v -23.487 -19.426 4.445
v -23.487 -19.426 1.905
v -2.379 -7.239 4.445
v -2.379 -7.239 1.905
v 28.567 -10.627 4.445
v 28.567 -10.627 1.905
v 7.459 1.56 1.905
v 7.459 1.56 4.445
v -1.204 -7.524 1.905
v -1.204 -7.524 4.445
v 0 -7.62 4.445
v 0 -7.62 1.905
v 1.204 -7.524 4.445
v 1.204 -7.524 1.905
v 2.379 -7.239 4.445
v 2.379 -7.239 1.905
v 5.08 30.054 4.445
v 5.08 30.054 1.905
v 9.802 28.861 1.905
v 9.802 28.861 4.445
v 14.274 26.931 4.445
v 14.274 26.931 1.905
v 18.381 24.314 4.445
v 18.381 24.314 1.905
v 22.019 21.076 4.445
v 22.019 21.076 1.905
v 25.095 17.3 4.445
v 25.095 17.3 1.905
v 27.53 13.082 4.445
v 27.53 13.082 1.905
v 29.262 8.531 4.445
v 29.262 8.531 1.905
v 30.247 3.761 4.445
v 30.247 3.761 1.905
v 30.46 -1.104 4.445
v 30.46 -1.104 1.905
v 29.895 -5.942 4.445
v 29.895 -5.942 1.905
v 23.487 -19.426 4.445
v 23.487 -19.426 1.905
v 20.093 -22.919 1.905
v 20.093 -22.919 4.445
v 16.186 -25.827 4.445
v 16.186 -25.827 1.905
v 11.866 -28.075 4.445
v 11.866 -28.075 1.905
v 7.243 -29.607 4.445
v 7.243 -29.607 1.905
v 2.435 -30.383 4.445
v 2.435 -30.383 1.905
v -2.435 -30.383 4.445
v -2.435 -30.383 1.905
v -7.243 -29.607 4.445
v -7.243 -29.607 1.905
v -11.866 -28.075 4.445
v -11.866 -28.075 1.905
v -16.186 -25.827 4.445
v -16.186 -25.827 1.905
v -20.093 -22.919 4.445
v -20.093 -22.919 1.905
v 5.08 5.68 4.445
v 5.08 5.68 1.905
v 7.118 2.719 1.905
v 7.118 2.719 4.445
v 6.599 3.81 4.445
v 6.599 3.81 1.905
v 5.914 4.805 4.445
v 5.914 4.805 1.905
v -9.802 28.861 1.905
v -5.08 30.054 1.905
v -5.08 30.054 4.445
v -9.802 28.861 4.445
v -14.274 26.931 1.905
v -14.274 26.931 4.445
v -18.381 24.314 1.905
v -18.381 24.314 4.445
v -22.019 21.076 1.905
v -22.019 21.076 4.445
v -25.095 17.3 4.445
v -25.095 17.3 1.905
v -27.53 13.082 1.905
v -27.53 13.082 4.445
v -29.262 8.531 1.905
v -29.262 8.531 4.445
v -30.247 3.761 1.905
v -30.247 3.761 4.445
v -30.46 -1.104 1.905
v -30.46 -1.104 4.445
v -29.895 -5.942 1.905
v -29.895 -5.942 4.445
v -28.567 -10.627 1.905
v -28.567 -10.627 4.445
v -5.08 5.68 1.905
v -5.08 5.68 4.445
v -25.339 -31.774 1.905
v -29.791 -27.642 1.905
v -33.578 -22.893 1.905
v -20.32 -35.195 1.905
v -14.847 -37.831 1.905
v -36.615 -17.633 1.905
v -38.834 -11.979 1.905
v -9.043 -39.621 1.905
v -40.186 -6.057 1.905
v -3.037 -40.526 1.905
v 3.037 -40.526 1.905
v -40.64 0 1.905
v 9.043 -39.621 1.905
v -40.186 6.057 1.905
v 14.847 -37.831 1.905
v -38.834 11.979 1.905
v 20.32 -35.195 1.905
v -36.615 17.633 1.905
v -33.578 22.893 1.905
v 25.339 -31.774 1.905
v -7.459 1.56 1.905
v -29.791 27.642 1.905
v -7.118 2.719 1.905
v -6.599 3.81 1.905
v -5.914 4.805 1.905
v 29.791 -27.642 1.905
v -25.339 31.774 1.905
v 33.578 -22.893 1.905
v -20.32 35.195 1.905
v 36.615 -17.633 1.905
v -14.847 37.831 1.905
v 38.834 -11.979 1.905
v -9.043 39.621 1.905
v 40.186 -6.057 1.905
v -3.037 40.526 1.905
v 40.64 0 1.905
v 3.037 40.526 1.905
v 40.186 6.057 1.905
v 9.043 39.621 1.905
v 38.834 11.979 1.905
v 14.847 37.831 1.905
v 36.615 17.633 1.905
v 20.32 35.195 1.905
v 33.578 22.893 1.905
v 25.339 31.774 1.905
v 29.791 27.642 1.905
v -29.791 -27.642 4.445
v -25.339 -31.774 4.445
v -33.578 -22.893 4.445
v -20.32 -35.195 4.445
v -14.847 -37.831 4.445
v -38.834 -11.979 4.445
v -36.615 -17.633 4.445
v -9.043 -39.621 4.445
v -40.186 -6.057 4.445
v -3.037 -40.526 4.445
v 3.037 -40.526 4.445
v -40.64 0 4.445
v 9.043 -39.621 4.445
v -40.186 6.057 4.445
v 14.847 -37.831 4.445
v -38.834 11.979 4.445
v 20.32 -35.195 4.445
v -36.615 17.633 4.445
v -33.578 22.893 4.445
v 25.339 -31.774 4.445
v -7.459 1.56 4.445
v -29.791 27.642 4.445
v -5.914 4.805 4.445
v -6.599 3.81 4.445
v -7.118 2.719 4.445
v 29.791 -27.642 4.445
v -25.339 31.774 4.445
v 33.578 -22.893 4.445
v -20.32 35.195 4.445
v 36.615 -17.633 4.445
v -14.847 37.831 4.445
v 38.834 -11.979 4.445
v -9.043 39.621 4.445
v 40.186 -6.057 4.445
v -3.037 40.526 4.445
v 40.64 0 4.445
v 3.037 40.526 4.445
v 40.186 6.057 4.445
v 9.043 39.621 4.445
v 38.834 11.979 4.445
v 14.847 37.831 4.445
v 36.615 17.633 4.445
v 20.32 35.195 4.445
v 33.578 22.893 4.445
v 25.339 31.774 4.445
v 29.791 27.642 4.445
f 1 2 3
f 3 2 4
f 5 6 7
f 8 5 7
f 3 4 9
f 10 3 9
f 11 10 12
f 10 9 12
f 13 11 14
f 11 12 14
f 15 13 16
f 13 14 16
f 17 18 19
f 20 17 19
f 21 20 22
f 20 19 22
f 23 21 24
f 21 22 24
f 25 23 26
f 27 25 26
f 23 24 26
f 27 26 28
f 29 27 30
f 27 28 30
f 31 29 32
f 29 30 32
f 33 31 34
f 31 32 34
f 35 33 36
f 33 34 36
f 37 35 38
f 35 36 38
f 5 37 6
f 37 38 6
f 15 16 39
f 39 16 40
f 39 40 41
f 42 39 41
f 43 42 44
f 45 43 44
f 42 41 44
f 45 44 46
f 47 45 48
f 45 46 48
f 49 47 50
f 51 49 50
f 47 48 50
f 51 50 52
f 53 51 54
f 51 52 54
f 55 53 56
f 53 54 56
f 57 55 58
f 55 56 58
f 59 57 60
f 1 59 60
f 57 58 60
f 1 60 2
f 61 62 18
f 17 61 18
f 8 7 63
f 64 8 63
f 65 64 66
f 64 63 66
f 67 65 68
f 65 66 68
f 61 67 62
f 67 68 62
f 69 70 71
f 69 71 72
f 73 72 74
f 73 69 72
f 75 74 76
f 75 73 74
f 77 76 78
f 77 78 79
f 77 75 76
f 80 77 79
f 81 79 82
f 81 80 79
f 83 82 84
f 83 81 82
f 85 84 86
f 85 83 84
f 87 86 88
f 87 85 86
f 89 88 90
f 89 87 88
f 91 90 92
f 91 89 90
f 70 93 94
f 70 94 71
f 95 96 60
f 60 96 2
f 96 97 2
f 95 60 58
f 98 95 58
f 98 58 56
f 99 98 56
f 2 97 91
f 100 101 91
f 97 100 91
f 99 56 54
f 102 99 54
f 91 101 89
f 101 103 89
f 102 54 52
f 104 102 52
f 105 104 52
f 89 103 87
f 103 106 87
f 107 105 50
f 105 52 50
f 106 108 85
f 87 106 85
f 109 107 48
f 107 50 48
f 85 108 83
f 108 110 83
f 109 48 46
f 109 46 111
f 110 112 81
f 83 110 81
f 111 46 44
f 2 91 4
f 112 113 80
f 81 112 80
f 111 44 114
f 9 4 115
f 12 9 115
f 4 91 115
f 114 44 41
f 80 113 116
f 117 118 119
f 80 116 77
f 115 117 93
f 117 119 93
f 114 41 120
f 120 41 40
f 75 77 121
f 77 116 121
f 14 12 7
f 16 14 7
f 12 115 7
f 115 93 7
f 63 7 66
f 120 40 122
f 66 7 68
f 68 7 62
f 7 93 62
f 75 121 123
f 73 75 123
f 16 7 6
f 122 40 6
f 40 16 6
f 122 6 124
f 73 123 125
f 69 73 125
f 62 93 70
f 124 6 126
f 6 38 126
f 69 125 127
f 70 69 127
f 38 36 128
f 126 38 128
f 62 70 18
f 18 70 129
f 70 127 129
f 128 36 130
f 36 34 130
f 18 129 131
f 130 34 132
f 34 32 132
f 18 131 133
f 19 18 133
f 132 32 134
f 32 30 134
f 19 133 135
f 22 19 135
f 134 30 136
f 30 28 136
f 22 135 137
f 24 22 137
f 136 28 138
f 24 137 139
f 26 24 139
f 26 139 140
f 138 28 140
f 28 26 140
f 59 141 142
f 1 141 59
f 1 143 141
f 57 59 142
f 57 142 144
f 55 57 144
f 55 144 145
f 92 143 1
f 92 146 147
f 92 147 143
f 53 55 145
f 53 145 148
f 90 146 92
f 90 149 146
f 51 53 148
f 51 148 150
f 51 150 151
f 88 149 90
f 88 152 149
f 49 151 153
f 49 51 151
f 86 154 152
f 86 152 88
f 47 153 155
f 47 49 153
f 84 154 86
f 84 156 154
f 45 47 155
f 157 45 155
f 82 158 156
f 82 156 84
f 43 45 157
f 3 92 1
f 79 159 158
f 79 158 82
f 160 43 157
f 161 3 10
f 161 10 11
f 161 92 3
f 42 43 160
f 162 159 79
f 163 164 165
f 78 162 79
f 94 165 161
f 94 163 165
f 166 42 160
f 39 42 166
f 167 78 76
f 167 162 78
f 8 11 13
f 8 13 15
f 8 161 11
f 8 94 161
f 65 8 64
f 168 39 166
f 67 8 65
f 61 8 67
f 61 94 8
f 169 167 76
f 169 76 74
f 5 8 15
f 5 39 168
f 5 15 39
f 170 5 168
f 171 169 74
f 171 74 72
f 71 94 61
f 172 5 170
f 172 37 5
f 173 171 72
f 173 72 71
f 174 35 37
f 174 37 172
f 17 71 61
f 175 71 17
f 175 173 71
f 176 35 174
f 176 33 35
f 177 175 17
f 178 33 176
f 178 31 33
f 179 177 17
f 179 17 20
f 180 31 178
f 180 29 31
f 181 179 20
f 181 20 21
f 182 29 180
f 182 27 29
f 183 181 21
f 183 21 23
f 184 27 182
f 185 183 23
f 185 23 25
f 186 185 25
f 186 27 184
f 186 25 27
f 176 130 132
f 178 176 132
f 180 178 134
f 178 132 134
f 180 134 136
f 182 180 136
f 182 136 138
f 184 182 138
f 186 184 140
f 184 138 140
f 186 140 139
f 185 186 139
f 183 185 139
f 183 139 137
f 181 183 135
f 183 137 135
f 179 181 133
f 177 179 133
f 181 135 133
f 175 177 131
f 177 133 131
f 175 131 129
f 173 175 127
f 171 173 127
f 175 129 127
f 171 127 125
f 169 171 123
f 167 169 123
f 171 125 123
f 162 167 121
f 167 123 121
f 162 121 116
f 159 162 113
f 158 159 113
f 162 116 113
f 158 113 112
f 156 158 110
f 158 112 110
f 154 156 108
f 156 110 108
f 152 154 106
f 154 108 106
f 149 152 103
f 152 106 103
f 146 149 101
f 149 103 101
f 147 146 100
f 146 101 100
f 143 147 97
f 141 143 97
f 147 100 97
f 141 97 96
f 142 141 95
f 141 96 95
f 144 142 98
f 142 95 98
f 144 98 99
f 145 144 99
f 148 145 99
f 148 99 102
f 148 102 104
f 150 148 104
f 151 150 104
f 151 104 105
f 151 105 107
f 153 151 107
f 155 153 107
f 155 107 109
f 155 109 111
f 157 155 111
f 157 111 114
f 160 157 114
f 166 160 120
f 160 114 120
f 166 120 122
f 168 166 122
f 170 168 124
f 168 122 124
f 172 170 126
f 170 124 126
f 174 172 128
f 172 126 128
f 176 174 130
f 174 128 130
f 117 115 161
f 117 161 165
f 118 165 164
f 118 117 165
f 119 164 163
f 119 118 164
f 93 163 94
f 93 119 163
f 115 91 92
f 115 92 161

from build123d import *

# Parameters (mm, degrees)
SKETCH1_R           = 101.6
BOSS_EXTRUDE1_DEPTH = 6.35
SCALE1_SCALE        = 0.4


with BuildPart() as part:
    # Sketch1 → Boss-Extrude1 (new body)
    with BuildSketch(Plane.XY):
        Circle(SKETCH1_R)
        with BuildLine():
            Line((-12.7, 14.199031657), (-12.7, 75.134213245))
            ThreePointArc((-12.7, 75.134213245), (-65.991135768, 38.1), (-71.418137364, -26.568583995))
            Line((-71.418137364, -26.568583995), (-18.646722124, 3.8990068))
            ThreePointArc((-18.646722124, 3.8990068), (-16.497783942, 9.525), (-12.7, 14.199031657))
        make_face(mode=Mode.SUBTRACT)
        with BuildLine():
            Line((12.7, 14.199031657), (12.7, 75.134213245))
            ThreePointArc((12.7, 75.134213245), (65.991135768, 38.1), (71.418137364, -26.568583995))
            Line((71.418137364, -26.568583995), (18.646722124, 3.8990068))
            ThreePointArc((18.646722124, 3.8990068), (16.497783942, 9.525), (12.7, 14.199031657))
        make_face(mode=Mode.SUBTRACT)
        with BuildLine():
            Line((5.946722124, -18.098038457), (58.718137364, -48.565629251))
            ThreePointArc((58.718137364, -48.565629251), (0, -76.2), (-58.718137364, -48.565629251))
            Line((-58.718137364, -48.565629251), (-5.946722124, -18.098038457))
            ThreePointArc((-5.946722124, -18.098038457), (0, -19.05), (5.946722124, -18.098038457))
        make_face(mode=Mode.SUBTRACT)
    extrude(amount=BOSS_EXTRUDE1_DEPTH)


with BuildPart() as part_1:
    # Scale1: scaled about (0, 0, 3.175)
    add(part.part.scale(SCALE1_SCALE).moved(Location((0, 0, 1.905))))


solid = part_1.part
